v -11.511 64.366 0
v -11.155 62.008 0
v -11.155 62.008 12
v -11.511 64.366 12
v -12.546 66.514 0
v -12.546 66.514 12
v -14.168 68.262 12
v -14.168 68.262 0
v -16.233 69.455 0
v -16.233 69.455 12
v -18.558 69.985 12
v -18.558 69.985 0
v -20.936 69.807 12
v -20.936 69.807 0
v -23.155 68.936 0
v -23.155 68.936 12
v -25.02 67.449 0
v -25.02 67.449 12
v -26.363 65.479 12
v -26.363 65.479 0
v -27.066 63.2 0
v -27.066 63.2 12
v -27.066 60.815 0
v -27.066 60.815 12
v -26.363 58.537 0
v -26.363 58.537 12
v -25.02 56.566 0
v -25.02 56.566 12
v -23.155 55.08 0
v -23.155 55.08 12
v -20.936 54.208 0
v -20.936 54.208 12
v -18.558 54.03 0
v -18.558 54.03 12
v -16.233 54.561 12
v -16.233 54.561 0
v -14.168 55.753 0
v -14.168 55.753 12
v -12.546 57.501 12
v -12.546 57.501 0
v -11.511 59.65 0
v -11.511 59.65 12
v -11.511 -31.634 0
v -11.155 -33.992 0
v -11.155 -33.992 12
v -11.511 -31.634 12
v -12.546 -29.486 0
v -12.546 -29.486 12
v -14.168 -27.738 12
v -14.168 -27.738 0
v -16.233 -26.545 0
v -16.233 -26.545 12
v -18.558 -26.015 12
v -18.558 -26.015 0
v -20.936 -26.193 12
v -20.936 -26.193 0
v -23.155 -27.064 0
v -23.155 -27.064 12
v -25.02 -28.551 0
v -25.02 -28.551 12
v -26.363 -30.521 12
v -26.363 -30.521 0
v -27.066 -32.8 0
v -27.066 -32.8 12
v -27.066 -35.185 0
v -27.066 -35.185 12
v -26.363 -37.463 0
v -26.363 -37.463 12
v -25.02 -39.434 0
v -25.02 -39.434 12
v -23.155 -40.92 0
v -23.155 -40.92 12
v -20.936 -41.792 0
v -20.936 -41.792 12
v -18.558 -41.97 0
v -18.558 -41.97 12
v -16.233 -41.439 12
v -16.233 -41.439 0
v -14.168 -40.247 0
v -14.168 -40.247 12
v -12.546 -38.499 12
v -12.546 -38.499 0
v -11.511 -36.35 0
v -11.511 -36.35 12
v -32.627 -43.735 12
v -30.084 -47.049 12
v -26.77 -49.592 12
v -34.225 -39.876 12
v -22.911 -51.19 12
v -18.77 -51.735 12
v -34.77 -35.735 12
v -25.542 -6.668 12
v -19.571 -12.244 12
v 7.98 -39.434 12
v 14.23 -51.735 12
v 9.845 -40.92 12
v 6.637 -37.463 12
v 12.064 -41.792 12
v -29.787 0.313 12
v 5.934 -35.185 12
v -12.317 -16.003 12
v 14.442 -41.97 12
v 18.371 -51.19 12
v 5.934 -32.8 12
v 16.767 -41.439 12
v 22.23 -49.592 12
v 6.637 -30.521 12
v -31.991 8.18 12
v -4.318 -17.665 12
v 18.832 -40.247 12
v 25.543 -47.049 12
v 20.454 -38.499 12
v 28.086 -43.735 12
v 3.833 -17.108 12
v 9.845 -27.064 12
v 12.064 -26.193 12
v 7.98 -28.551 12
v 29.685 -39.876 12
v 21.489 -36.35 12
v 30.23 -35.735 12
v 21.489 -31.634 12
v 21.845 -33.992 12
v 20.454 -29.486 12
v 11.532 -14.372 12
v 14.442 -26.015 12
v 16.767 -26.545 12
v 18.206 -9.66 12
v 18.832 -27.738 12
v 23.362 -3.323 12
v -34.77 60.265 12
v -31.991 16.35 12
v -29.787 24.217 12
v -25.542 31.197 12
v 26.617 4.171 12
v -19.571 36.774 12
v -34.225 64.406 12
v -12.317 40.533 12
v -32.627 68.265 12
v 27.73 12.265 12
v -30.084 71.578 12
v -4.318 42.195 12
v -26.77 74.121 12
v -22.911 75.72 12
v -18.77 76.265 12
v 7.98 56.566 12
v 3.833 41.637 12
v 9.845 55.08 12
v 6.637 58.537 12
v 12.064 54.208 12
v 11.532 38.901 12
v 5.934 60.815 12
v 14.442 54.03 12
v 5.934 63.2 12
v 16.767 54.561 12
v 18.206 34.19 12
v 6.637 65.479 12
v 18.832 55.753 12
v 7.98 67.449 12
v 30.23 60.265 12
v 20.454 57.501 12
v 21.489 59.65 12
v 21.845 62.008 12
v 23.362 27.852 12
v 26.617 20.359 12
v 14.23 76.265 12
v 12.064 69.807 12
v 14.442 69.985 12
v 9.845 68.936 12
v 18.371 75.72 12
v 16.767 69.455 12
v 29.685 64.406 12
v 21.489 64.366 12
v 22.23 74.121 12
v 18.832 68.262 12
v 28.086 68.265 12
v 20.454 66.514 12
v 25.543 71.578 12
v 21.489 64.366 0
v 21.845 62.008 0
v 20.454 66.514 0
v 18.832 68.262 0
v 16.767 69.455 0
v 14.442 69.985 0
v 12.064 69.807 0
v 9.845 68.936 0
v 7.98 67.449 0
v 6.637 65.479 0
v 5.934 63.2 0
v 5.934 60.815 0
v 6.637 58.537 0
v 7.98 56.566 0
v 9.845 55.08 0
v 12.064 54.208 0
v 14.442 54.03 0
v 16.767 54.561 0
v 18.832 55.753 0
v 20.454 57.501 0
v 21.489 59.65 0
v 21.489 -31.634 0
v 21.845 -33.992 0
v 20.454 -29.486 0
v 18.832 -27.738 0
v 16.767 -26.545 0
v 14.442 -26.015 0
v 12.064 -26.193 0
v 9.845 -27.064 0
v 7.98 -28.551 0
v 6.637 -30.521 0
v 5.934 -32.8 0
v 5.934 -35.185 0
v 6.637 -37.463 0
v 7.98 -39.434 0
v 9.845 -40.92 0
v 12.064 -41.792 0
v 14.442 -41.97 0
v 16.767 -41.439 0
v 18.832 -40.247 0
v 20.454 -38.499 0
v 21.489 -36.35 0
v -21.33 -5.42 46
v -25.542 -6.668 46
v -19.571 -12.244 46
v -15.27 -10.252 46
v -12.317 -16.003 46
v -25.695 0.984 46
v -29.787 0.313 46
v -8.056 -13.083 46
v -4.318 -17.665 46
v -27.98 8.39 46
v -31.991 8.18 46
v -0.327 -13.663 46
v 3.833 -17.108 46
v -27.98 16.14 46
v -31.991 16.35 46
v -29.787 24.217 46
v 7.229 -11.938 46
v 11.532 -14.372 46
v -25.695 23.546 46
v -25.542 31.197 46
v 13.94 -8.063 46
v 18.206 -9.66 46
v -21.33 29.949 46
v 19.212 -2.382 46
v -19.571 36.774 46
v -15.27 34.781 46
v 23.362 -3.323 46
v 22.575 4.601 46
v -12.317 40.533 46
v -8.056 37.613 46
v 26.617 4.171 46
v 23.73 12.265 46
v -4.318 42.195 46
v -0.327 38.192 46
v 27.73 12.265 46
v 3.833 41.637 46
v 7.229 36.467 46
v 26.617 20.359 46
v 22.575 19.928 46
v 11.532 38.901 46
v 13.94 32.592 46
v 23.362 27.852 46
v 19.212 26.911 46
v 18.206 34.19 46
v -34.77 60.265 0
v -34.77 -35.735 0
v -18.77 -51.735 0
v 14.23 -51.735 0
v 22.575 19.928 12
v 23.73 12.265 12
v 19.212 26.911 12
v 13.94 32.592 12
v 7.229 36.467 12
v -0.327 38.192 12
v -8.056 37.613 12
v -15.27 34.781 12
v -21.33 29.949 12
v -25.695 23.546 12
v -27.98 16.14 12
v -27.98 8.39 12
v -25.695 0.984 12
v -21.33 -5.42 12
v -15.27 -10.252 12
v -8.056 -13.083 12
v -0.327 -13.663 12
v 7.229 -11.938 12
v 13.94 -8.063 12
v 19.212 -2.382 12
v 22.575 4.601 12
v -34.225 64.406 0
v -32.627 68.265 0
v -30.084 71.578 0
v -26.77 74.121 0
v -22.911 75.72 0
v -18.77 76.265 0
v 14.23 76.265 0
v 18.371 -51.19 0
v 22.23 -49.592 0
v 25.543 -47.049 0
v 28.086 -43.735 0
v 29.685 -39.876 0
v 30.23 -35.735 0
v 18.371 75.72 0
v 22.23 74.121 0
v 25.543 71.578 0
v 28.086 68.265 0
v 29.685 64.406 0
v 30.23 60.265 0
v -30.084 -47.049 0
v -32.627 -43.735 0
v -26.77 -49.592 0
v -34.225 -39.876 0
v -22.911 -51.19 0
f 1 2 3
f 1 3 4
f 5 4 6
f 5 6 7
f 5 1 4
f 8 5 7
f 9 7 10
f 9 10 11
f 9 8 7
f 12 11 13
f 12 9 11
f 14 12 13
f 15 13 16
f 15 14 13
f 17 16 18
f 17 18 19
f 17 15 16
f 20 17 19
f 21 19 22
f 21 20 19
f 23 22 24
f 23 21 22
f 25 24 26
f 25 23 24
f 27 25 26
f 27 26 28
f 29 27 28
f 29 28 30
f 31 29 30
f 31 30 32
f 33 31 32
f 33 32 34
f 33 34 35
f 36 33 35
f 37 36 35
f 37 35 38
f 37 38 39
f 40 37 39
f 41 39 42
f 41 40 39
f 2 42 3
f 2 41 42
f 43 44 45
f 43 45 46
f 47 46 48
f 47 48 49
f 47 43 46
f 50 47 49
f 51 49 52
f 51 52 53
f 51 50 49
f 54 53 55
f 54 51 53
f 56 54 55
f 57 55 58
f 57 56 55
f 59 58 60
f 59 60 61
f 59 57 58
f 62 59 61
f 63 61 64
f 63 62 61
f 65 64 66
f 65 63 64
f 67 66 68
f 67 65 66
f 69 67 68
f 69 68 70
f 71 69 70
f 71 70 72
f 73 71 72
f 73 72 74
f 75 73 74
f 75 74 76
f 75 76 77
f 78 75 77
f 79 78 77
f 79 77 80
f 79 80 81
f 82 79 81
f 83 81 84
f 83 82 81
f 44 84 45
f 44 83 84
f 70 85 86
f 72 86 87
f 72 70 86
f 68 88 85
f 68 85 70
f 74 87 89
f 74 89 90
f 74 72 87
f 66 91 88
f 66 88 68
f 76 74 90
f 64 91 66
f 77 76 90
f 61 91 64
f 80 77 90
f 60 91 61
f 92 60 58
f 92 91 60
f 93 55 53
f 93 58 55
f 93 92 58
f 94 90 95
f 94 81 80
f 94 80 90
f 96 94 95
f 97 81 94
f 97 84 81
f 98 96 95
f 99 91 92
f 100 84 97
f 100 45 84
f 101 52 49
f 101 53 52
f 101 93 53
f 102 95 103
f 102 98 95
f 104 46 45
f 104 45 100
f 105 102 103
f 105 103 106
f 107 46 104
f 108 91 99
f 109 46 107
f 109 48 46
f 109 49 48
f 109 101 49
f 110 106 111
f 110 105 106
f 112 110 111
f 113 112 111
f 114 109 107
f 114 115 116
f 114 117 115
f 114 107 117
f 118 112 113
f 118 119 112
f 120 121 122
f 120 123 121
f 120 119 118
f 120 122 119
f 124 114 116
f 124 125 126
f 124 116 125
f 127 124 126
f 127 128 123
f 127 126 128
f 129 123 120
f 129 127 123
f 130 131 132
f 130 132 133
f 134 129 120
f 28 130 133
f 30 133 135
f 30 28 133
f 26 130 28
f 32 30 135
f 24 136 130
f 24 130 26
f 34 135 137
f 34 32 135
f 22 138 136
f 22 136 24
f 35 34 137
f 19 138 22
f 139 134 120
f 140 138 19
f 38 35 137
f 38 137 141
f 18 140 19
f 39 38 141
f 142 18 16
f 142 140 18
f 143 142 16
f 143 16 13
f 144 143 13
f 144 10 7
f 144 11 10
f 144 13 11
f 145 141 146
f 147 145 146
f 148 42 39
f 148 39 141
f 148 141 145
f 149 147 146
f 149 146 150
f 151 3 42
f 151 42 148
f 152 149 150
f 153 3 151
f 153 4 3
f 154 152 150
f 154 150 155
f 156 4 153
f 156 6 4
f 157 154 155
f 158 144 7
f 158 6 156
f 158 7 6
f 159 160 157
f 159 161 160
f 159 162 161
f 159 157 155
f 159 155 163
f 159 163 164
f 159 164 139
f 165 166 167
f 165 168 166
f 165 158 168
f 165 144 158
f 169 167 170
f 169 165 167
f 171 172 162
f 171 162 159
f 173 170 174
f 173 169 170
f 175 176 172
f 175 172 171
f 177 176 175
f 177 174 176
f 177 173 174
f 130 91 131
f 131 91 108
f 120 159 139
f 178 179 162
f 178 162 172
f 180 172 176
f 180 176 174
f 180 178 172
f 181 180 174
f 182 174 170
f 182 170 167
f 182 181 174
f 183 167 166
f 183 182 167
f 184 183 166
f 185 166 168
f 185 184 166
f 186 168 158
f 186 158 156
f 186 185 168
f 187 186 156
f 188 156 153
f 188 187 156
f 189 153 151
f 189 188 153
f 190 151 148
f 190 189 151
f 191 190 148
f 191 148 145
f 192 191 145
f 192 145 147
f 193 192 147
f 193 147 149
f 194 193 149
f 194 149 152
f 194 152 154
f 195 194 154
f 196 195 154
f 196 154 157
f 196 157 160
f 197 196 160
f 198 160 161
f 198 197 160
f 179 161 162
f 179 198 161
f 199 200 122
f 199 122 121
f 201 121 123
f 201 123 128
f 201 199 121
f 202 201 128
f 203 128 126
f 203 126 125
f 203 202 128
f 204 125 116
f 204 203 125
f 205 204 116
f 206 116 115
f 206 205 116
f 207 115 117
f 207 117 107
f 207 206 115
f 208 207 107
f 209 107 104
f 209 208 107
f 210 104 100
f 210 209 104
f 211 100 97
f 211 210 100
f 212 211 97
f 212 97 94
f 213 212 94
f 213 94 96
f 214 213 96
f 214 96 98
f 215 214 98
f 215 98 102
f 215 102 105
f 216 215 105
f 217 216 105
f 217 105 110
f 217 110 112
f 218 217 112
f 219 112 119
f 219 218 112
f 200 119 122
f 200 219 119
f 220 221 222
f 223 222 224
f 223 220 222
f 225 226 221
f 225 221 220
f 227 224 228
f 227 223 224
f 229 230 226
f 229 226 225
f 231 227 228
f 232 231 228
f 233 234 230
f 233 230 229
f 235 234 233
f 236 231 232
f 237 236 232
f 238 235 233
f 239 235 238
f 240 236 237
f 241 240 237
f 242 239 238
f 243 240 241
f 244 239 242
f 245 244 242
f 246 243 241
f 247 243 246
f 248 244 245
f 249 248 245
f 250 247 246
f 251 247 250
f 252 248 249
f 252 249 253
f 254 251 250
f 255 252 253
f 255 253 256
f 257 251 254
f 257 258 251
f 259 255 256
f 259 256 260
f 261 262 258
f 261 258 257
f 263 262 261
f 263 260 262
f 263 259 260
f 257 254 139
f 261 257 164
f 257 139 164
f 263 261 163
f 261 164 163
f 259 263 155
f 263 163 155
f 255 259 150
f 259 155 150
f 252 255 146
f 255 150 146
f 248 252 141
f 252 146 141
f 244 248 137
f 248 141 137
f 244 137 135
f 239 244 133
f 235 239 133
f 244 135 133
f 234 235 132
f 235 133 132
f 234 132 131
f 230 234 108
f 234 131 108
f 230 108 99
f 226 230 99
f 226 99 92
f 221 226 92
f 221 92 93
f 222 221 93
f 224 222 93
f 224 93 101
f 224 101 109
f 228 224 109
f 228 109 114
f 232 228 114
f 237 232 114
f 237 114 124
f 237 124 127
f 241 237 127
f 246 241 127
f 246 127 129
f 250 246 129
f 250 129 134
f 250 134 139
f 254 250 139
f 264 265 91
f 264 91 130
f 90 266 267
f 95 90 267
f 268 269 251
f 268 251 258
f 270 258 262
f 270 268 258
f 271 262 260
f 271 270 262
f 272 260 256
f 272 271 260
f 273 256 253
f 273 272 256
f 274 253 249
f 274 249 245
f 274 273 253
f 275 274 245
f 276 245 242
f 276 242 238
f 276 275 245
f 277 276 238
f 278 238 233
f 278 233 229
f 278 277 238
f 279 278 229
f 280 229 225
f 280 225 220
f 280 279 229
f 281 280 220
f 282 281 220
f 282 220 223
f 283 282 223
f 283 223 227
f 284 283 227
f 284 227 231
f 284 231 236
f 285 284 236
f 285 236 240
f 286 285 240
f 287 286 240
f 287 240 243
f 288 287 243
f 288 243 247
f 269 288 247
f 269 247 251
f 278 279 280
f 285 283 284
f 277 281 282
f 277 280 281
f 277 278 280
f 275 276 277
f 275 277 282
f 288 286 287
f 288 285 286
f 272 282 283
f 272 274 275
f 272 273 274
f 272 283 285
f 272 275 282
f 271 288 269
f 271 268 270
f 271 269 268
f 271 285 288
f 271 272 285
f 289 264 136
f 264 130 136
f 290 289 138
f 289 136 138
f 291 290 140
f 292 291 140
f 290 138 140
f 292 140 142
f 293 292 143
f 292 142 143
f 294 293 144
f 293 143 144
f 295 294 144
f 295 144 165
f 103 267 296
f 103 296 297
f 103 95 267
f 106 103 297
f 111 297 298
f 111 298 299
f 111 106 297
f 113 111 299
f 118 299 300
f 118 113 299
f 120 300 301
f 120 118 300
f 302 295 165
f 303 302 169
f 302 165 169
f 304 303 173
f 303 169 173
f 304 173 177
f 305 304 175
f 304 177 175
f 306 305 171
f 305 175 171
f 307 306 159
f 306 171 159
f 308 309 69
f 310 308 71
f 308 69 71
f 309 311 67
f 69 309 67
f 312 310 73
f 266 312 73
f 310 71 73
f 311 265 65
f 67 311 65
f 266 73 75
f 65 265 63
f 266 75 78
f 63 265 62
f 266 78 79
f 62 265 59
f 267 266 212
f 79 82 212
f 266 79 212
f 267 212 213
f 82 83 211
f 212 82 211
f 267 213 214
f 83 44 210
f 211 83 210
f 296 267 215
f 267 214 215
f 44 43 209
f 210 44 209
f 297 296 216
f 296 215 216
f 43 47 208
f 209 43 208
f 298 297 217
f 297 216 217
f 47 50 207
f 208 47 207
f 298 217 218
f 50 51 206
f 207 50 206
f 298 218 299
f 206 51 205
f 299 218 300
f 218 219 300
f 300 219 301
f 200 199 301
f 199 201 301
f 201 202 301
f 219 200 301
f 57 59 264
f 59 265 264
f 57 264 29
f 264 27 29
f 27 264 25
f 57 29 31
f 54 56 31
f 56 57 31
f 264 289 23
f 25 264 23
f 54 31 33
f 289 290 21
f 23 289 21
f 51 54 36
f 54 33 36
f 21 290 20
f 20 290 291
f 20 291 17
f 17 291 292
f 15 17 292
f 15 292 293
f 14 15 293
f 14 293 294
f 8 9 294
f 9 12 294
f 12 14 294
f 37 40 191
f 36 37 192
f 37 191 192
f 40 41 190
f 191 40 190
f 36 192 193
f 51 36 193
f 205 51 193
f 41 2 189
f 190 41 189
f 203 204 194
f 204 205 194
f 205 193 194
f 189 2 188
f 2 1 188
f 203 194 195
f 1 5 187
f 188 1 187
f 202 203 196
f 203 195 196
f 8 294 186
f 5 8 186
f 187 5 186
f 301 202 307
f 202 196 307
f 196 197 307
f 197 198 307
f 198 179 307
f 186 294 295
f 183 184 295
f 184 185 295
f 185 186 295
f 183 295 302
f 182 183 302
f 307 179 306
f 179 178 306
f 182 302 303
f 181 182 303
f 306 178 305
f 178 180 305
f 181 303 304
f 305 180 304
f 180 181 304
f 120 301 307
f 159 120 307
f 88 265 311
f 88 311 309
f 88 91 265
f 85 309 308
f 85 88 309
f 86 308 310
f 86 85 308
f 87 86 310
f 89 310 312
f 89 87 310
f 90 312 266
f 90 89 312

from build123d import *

# Parameters (mm, degrees)
F0_W     = 65
F0_H     = 128
F0_R     = 8
F1_DEPTH = 12
F2_R     = 16
F3_R     = 30
F3_R_2   = 26
F4_DEPTH = 46


with BuildPart() as f1:
    # F0 (on Top) → F1 (new body)
    with BuildSketch(Plane.XY):
        with Locations((-2.270288, 12.264718)):
            Rectangle(F0_W, F0_H)
        with Locations((-19.155467, -33.992235)):
            Circle(F0_R, mode=Mode.SUBTRACT)
        with Locations((13.844533, -33.992235)):
            Circle(F0_R, mode=Mode.SUBTRACT)
        with Locations((-19.155467, 62.007765)):
            Circle(F0_R, mode=Mode.SUBTRACT)
        with Locations((13.844533, 62.007765)):
            Circle(F0_R, mode=Mode.SUBTRACT)
    extrude(amount=F1_DEPTH)

    # F2
    f2_edges = [f1.edges().sort_by_distance(p)[0] for p in [
        (30.229712, -51.735282, 6),
        (-34.770288, -51.735282, 6),
        (-34.770288, 76.264718, 6),
        (30.229712, 76.264718, 6),
    ]]
    fillet(f2_edges, radius=F2_R)

    # F3 (on Top) → F4 (join)
    with BuildSketch(Plane.XY):
        with Locations((-2.270288, 12.264718)):
            Circle(F3_R)
        with Locations((-2.270288, 12.264718)):
            Circle(F3_R_2, mode=Mode.SUBTRACT)
    extrude(amount=F4_DEPTH)


solid = f1.part
